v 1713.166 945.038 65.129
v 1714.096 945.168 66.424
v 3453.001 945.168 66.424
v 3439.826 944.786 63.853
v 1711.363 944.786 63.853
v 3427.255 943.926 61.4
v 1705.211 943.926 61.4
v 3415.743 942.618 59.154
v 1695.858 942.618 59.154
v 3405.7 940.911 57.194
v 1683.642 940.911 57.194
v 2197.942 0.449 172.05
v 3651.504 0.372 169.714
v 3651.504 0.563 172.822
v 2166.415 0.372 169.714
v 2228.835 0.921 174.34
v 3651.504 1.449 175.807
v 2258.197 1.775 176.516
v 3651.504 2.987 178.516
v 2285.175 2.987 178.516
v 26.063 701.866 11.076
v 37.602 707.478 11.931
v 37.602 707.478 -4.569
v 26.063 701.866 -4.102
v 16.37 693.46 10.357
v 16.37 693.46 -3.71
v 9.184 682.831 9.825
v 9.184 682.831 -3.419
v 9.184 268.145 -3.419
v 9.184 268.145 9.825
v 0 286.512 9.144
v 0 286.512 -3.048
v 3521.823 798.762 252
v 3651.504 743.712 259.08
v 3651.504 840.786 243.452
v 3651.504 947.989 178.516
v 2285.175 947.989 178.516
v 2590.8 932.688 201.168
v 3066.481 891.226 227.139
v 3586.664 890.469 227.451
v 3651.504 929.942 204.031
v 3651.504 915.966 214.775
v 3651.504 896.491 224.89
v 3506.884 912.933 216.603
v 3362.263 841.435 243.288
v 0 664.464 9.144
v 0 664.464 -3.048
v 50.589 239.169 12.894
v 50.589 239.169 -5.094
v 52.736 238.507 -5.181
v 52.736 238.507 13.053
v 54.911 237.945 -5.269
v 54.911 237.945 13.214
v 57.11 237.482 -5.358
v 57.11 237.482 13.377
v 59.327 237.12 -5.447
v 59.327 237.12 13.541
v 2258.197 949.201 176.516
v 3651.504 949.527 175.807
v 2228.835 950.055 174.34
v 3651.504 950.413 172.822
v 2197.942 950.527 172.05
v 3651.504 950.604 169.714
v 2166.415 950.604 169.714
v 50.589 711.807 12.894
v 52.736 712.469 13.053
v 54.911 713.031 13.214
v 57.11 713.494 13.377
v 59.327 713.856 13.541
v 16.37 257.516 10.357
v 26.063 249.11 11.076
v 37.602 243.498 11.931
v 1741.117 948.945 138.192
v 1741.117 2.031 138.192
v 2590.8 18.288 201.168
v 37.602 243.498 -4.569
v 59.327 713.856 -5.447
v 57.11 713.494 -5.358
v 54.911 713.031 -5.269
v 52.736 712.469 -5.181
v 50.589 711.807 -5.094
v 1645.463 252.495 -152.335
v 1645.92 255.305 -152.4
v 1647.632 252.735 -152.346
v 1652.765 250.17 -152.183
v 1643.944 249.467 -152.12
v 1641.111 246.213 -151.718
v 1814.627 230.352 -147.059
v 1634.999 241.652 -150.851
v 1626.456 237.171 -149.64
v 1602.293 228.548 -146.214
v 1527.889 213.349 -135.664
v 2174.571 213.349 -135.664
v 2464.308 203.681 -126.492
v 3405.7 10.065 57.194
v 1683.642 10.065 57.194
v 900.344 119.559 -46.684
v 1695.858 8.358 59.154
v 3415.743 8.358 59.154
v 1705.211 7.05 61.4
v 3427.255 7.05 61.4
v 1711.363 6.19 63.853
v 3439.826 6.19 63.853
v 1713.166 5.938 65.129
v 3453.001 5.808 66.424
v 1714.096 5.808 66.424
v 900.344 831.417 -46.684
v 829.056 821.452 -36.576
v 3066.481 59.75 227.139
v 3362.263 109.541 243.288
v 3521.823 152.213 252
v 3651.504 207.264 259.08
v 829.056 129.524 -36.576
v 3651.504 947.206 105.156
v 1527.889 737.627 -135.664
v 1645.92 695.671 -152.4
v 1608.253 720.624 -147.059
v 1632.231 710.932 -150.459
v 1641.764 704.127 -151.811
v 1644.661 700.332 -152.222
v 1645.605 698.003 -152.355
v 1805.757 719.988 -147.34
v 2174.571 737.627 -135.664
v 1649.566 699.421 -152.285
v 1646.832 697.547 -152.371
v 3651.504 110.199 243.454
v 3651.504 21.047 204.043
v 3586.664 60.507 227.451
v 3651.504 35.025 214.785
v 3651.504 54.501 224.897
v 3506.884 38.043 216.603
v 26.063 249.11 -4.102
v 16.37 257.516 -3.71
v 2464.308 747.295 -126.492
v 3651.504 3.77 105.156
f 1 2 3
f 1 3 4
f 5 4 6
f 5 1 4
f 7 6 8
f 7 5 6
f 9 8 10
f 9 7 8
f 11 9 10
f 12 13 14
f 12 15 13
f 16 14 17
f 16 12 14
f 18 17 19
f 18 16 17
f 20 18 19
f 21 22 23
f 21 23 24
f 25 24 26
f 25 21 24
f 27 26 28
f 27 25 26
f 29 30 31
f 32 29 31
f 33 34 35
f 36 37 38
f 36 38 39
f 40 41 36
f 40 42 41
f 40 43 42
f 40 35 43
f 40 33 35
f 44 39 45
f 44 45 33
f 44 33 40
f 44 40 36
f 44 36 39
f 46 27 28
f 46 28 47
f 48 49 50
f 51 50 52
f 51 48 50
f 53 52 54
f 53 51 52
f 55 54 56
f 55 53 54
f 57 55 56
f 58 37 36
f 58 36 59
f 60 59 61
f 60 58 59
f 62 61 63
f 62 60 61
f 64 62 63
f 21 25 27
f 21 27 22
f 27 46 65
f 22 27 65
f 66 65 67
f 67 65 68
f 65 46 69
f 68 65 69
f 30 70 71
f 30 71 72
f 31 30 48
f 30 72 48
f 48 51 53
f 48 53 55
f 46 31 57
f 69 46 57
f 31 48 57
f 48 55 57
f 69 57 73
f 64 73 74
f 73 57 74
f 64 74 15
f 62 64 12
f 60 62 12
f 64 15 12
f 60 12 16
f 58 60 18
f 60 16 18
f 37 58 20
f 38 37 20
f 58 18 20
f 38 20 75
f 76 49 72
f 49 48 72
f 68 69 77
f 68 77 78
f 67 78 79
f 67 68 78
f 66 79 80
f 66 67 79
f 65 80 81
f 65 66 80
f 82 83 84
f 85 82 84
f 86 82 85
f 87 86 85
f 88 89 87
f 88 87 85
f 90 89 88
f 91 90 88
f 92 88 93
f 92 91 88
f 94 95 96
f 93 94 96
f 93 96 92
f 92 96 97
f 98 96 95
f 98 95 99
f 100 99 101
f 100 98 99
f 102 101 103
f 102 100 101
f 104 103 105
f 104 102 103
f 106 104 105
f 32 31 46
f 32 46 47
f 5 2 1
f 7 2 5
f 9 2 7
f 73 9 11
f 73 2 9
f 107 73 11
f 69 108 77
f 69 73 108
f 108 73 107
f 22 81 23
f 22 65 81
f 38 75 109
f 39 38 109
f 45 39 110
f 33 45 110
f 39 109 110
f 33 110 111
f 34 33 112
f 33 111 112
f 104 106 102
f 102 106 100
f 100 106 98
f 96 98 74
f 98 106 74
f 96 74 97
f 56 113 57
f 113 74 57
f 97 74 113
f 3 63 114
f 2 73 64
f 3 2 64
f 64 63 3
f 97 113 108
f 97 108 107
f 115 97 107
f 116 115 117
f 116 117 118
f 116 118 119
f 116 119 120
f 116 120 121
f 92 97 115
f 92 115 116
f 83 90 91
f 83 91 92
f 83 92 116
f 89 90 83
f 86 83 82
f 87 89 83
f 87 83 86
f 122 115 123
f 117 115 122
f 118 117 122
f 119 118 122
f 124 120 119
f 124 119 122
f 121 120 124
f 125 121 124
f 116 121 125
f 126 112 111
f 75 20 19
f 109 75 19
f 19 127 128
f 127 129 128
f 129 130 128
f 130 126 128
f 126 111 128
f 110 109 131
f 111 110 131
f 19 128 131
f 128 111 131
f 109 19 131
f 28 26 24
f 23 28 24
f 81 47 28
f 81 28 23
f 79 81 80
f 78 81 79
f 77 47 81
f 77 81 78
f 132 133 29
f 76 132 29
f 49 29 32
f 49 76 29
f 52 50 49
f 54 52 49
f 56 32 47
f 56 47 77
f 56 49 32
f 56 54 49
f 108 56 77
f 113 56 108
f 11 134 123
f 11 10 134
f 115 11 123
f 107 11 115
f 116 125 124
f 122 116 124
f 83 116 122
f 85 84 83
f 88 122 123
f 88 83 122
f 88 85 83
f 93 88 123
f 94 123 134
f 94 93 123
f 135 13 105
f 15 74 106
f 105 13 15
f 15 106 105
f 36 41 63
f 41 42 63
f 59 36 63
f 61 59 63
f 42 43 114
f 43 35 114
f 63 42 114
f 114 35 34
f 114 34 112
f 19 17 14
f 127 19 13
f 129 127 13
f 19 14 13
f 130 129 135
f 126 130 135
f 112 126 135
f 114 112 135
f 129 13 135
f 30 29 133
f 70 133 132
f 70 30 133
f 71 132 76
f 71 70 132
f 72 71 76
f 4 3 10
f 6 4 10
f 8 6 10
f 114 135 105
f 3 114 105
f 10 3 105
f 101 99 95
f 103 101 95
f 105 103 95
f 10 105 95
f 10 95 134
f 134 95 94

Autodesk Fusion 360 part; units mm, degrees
sketch "Sketch1" plane through (0, 0, 0) normal (0, 1, 0) x (1, 0, 0)
  line L0 (0, 0) -> (3657.6, 0) construction
  line L1 (0, -9.144) -> (2590.8, -201.168)
  line L2 (2590.8, -201.168) -> (3651.504, -259.08)
  line L3 (3651.504, -259.08) -> (3651.504, -105.156)
  line L4 (3651.504, -105.156) -> (2464.308, 126.492)
  line L5 (0, -9.144) -> (0, 3.048)
  line L6 (0, 3.048) -> (829.056, 36.576)
  line L7 (829.056, 36.576) -> (1645.92, 152.4)
  line L8 (1645.92, 152.4) -> (2464.308, 126.492)
  dimension "d1" = 3657.6
extrude "Extrude1" add sketch "Sketch1" along normal blind 950.976
sketch "Sketch3" plane through (0, 0, 0) normal (0, 0, 1) x (1, 0, 0)
  line L0 (3657.6, 0) -> (3657.6, 950.976)
  dimension "d4" = 950.976
ref_plane "WorkPlane1" through (0, 0, 609.6) normal (0, 0, 1) x (1, 0, 0)
sketch "Sketch5" plane through (0, 0, 609.6) normal (0, 0, 1) x (1, 0, 0)
sketch "Sketch4" plane through (0, 0, 609.6) normal (0, 0, 1) x (1, 0, 0)
  line L0 (0, 0) -> (0, 950.976)
  line L1 (0, 475.488) -> (3657.5999, 475.488)
  line L2 (1755.648, 950.976) -> (59.327, 713.8559)
  line L3 (50.5889, 711.807) -> (37.6015, 707.4778)
  line L4 (9.1835, 682.8311) -> (0, 664.464)
  line L5 (0, 950.976) -> (1755.648, 950.976)
  arc A0 (37.6015, 707.4778) -> (9.1835, 682.8311) centre (53.1437, 660.851) ccw
  arc A1 (59.327, 713.8559) -> (50.5889, 711.807) centre (66.1311, 665.1801) ccw
  line L6 (1755.648, 0) -> (59.327, 237.1201)
  arc A2 (50.5889, 239.169) -> (59.327, 237.1201) centre (66.1311, 285.7959) ccw
  line L7 (50.5889, 239.169) -> (37.6015, 243.4982)
  arc A3 (9.1835, 268.1449) -> (37.6015, 243.4982) centre (53.1437, 290.125) ccw
  line L8 (9.1835, 268.1449) -> (0, 286.512)
  line L9 (0, 0) -> (1755.648, 0)
  dimension "d5" = 49.149
extrude "Extrude3" cut sketch "Sketch4" against normal blind 1005.84
sketch "Sketch6" plane through (0, 0, 0) normal (1, 0, 0) x (0, 1, 0)
  line L0 (975.36, 274.32) -> (-30.48, 274.32)
  line L1 (-30.48, 274.32) -> (-30.48, -182.88)
  line L2 (-30.48, -182.88) -> (975.36, -182.88)
  line L3 (975.36, -182.88) -> (975.36, 274.32)
  line L4 (950.976, 259.08) -> (0, 259.08) construction
  line L5 (475.488, 259.08) -> (475.488, 329.184)
  line L6 (475.488, 329.184) -> (475.488, -259.9361)
  line L7 (475.488, 259.08) -> (743.712, 259.08)
  line L8 (950.6039, 169.7136) -> (945.1676, 66.4238)
  line L9 (940.9107, 57.1943) -> (737.6274, -135.6643)
  line L10 (707.136, -164.592) -> (707.136, -182.88)
  spline S0 degree 5 poles (743.712, 259.08) (746.3796, 258.8054) (751.6686, 258.2475) (759.4637, 257.3843) (769.5788, 256.1803) (781.7643, 254.5815) (793.5174, 252.8745) (804.9017, 251.0321) (816.0295, 249.0107) (827.0873, 246.7445) (838.3149, 244.1487) (849.9297, 241.1323) (862.0647, 237.6086) (874.7007, 233.5076) (887.597, 228.788) (900.2199, 223.4503) (911.9081, 217.5377) (922.0259, 211.1385) (930.136, 204.3899) (936.1341, 197.479) (940.4921, 190.6573) (943.39, 185.4946) (945.6182, 181.8896) (947.1853, 179.6184) (947.9893, 178.5158) knots 0 0 0 0 0 0 0.05 0.1 0.15 0.2 0.25 0.3 0.35 0.4 0.45 0.5 0.55 0.6 0.65 0.7 0.75 0.8 0.85 0.9 0.95 1 1 1 1 1 1
  arc A0 (950.6039, 169.7136) -> (947.9893, 178.5158) centre (936.9068, 170.4345) ccw
  arc A1 (940.9107, 57.1943) -> (945.1676, 66.4238) centre (931.4705, 67.1447) ccw
  line L11 (475.488, -152.4) -> (695.671, -152.4)
  arc A2 (695.671, -152.4) -> (737.6274, -135.6643) centre (695.671, -91.44) ccw
  line L12 (0, 259.08) -> (950.976, 259.08) construction
  spline S1 degree 5 poles (207.264, 259.08) (204.5964, 258.8054) (199.3074, 258.2475) (191.5124, 257.3843) (181.3972, 256.1803) (169.2117, 254.5815) (157.4586, 252.8745) (146.0743, 251.0321) (134.9465, 249.0107) (123.8887, 246.7445) (112.6611, 244.1487) (101.0464, 241.1323) (88.9113, 237.6086) (76.2753, 233.5076) (63.379, 228.788) (50.7561, 223.4503) (39.0679, 217.5377) (28.9501, 211.1385) (20.84, 204.3899) (14.8419, 197.479) (10.4839, 190.6573) (7.586, 185.4946) (5.3579, 181.8896) (3.7907, 179.6184) (2.9867, 178.5158) knots 0 0 0 0 0 0 0.05 0.1 0.15 0.2 0.25 0.3 0.35 0.4 0.45 0.5 0.55 0.6 0.65 0.7 0.75 0.8 0.85 0.9 0.95 1 1 1 1 1 1
  line L13 (717.3108, 261.7973) -> (770.1132, 256.3627)
  line L14 (935.3956, 195.7866) -> (960.5831, 161.245)
  line L15 (233.6652, 261.7973) -> (180.8628, 256.3627)
  line L16 (15.5804, 195.7866) -> (-9.6071, 161.245)
  line L17 (0.3721, 169.7136) -> (5.8084, 66.4238)
  arc A3 (2.9867, 178.5158) -> (0.3721, 169.7136) centre (14.0692, 170.4345) ccw
  arc A4 (5.8084, 66.4238) -> (10.0653, 57.1943) centre (19.5055, 67.1447) ccw
  line L18 (10.0653, 57.1943) -> (213.3486, -135.6643)
  arc A5 (213.3486, -135.6643) -> (255.305, -152.4) centre (255.305, -91.44) ccw
  line L19 (475.488, -152.4) -> (255.305, -152.4)
  line L20 (207.264, 259.08) -> (475.488, 259.08)
  point P0 (810.768, 249.936)
  point P1 (874.5914, 233.4128)
  point P2 (932.688, 201.168)
  point P3 (140.208, 249.936)
  point P4 (76.3846, 233.4128)
  point P5 (18.288, 201.168)
  dimension "d13" = 13.716
  dimension "d14" = 60.96
extrude "Extrude4" cut sketch "Sketch6" along normal blind 3962.4 contours L0 L2 L3 L5 L6 L7 L8 L9 S0 A0 A1 L11 A2 | L0 L1 L2 L5 L6 S1 L17 A3 A4 L18 A5 L19 L20
